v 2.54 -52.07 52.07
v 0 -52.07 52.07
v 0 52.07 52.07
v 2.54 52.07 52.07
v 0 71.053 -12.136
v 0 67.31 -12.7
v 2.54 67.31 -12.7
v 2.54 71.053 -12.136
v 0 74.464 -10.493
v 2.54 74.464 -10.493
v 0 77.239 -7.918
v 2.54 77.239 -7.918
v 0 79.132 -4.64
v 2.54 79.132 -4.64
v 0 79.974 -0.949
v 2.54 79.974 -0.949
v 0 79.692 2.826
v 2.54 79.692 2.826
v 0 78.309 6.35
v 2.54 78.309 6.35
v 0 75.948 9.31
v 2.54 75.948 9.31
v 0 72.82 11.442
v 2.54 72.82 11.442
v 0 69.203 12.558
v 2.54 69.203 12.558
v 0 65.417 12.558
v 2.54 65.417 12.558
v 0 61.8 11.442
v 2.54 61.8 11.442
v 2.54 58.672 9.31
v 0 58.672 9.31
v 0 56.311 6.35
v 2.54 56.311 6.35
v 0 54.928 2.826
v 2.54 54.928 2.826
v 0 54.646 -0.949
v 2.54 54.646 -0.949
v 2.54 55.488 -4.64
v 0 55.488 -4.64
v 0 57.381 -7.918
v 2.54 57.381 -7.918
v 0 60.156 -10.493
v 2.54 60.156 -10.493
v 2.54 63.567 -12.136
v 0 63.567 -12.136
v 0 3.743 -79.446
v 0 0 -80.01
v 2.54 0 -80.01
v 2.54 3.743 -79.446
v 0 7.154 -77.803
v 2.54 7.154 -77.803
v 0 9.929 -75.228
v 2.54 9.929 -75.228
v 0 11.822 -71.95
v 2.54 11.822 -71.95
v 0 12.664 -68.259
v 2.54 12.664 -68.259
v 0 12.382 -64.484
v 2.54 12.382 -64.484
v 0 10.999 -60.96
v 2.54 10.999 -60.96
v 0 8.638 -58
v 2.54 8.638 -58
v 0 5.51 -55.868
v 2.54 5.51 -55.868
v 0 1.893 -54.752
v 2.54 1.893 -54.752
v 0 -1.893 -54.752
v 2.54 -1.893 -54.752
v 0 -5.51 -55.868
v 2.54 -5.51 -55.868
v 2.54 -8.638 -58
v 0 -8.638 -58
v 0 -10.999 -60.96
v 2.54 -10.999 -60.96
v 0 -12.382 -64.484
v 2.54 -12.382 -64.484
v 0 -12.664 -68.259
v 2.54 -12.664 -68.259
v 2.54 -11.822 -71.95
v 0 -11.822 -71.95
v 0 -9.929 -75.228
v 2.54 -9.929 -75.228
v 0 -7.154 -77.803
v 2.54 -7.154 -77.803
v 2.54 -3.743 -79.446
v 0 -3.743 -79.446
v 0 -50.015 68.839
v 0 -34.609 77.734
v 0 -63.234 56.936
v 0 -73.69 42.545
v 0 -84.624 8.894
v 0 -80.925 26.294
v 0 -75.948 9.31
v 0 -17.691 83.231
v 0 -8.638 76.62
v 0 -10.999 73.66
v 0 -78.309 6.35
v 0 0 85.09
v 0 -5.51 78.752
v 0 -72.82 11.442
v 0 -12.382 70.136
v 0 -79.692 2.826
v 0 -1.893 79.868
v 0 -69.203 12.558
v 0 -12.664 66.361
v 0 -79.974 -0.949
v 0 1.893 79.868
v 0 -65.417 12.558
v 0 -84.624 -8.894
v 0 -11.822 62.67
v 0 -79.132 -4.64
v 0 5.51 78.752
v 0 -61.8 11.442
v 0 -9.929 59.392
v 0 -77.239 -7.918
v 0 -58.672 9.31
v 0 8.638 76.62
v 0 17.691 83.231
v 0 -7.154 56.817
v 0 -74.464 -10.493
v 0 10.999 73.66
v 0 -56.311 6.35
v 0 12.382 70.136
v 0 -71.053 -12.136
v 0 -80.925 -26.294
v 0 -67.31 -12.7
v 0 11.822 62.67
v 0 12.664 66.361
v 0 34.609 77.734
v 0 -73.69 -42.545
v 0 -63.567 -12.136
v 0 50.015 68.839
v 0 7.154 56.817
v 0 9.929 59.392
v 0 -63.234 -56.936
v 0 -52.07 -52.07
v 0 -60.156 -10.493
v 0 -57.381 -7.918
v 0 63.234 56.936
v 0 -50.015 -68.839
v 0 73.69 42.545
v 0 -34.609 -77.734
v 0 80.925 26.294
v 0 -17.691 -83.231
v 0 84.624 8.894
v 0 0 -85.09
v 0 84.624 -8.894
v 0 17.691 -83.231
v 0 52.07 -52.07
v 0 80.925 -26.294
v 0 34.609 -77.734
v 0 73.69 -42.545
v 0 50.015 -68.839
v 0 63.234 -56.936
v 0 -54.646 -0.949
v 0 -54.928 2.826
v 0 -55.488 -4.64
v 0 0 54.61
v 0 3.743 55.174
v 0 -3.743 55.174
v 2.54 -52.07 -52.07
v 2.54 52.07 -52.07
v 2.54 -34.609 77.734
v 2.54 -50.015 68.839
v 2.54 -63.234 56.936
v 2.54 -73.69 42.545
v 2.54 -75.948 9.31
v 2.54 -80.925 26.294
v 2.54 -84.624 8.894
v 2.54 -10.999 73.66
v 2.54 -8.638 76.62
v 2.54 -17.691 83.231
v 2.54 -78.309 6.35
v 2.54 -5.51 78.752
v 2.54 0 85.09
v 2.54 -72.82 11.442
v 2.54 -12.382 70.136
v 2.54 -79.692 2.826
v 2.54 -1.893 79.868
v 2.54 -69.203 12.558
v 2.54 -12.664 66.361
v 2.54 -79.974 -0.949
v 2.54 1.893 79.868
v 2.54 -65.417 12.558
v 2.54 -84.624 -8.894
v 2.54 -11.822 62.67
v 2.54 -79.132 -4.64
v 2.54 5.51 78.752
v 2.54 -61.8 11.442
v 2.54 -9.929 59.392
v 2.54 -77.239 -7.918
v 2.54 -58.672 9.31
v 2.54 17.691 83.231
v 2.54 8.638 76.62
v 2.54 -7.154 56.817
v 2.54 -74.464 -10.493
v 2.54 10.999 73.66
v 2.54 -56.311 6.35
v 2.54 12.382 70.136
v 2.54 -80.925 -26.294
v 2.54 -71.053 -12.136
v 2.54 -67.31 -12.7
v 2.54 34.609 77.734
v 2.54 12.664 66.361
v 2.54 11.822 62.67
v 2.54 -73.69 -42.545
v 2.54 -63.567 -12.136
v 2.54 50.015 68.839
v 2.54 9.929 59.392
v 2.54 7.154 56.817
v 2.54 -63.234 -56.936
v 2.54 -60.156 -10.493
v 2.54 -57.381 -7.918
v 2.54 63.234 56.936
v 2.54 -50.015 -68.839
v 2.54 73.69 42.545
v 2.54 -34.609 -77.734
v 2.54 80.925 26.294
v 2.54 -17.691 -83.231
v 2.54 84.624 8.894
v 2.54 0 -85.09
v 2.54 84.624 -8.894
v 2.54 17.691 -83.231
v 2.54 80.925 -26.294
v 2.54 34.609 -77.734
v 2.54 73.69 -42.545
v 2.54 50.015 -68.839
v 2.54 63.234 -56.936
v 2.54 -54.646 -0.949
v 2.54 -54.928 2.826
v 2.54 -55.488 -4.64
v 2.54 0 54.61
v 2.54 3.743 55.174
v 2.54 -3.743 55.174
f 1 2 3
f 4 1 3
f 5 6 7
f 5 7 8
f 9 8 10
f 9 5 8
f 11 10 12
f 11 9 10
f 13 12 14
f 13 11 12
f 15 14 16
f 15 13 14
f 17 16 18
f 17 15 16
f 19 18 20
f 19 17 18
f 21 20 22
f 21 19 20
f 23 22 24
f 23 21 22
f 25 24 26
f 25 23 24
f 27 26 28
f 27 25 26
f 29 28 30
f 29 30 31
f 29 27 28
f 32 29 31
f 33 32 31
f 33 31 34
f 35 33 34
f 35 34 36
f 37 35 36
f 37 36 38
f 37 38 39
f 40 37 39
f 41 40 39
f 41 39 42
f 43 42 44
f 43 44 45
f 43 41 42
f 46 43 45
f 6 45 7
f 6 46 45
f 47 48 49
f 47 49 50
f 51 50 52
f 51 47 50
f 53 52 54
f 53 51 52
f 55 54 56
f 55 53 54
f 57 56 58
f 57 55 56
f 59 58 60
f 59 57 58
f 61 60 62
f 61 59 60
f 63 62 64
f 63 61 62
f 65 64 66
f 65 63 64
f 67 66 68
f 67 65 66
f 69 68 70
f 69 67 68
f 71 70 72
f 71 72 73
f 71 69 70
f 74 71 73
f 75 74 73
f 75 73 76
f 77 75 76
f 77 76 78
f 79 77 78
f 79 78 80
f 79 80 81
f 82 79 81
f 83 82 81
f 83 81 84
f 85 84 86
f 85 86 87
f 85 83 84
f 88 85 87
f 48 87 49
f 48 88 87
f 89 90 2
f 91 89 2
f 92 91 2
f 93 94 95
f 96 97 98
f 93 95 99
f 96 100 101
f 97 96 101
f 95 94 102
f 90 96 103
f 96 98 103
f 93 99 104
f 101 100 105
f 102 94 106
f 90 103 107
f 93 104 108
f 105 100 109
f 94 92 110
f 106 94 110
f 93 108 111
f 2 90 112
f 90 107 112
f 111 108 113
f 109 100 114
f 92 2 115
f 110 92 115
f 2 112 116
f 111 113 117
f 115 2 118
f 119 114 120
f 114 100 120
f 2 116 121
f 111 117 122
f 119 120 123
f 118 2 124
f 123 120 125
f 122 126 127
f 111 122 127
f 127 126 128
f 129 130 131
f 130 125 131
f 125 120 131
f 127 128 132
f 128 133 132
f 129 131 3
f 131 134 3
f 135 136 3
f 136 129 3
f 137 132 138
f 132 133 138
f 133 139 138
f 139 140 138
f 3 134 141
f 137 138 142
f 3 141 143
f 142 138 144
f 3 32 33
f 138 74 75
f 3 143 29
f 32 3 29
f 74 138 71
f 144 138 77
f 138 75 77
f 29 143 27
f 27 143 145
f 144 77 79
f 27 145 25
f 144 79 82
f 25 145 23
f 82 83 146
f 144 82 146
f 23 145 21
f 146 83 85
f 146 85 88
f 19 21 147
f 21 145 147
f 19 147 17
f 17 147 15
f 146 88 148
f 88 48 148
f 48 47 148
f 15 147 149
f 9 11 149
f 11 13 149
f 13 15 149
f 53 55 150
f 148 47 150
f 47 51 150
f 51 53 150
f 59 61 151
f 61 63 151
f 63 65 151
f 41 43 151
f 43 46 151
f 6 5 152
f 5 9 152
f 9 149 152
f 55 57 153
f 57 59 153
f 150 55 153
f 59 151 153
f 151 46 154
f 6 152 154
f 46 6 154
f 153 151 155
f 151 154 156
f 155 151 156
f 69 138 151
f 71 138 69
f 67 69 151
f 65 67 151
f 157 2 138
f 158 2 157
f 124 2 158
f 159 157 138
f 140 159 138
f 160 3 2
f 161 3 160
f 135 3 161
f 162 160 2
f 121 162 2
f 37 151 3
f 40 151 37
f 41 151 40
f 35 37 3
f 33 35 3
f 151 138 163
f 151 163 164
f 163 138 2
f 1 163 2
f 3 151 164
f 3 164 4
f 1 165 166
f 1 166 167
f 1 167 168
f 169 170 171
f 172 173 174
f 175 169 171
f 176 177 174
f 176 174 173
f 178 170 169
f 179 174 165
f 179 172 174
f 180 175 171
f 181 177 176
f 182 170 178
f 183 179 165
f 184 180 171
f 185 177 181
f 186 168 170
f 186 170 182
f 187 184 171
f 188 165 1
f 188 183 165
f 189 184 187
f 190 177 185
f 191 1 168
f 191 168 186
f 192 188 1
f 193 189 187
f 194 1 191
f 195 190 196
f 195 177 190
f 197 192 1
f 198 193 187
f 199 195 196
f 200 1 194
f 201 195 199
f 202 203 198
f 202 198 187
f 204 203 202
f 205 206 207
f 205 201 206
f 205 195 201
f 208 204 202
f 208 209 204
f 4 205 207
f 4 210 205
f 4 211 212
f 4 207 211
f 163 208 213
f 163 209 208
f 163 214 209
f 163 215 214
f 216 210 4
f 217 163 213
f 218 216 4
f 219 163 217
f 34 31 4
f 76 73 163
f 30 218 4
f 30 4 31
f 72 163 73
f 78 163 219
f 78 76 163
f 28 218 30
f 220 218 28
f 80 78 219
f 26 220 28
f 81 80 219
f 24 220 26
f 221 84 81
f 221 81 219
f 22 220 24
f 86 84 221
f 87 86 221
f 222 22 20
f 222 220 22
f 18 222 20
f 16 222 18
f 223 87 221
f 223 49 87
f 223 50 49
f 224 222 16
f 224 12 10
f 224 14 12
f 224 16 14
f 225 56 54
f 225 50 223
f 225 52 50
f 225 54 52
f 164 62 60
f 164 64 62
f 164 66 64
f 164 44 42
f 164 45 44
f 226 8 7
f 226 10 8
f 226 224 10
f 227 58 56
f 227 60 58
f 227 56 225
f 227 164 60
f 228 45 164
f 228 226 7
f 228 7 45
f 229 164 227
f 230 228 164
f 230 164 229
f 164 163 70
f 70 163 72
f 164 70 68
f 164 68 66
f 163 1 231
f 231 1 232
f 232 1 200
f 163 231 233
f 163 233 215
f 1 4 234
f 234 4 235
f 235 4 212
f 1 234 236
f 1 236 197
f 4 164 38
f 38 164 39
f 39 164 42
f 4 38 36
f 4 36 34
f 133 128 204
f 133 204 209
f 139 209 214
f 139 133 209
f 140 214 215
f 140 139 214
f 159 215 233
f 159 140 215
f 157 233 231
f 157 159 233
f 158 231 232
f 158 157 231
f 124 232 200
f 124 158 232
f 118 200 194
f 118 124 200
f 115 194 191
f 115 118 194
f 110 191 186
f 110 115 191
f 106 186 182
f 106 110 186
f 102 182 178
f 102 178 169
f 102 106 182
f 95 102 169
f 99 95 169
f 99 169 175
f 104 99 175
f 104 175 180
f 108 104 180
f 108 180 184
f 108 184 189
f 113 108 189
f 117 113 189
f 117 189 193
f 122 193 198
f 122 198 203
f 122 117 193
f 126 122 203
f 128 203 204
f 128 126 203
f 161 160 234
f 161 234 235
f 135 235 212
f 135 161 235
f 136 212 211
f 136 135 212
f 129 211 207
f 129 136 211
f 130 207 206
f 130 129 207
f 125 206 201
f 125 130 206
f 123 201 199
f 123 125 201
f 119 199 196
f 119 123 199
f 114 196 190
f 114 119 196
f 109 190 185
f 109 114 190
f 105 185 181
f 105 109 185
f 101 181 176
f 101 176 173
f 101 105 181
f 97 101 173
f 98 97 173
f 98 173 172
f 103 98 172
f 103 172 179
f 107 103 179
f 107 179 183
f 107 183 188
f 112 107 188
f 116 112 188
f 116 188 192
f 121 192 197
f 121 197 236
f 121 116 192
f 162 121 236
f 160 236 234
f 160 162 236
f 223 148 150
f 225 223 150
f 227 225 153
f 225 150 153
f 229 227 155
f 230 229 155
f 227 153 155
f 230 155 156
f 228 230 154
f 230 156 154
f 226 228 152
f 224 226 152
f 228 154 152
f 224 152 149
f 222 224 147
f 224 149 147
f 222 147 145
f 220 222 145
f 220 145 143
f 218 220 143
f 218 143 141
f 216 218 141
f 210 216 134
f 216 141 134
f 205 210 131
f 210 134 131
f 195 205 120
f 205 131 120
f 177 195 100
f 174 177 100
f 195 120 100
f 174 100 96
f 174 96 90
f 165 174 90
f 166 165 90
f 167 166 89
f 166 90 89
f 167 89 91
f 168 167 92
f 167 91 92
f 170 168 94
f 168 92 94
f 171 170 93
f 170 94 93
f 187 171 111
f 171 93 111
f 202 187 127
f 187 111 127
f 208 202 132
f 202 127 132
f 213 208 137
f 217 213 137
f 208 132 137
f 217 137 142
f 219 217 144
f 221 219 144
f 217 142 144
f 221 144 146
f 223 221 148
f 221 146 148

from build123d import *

# Parameters (mm, degrees)
SKETCH2_R           = 85.09
SKETCH2_R_2         = 12.7
SKETCH2_W           = 104.14
SKETCH2_H           = 104.14
BOSS_EXTRUDE1_DEPTH = 2.54


with BuildPart() as part:
    # Sketch2 → Boss-Extrude1 (new body)
    with BuildSketch(Plane.YZ):
        with Locations(Location((0, 0, 0), (0, 0, 270))):
            Circle(SKETCH2_R)
        with Locations(Location((0, 67.31, 0), (0, 0, 270))):
            Circle(SKETCH2_R_2, mode=Mode.SUBTRACT)
        with Locations(Location((67.31, 0, 0), (0, 0, 270))):
            Circle(SKETCH2_R_2, mode=Mode.SUBTRACT)
        with Locations(Location((0, -67.31, 0), (0, 0, 270))):
            Circle(SKETCH2_R_2, mode=Mode.SUBTRACT)
        with Locations(Location((-67.31, 0, 0), (0, 0, 270))):
            Circle(SKETCH2_R_2, mode=Mode.SUBTRACT)
        Rectangle(SKETCH2_W, SKETCH2_H, mode=Mode.SUBTRACT)
    extrude(amount=BOSS_EXTRUDE1_DEPTH)


solid = part.part
